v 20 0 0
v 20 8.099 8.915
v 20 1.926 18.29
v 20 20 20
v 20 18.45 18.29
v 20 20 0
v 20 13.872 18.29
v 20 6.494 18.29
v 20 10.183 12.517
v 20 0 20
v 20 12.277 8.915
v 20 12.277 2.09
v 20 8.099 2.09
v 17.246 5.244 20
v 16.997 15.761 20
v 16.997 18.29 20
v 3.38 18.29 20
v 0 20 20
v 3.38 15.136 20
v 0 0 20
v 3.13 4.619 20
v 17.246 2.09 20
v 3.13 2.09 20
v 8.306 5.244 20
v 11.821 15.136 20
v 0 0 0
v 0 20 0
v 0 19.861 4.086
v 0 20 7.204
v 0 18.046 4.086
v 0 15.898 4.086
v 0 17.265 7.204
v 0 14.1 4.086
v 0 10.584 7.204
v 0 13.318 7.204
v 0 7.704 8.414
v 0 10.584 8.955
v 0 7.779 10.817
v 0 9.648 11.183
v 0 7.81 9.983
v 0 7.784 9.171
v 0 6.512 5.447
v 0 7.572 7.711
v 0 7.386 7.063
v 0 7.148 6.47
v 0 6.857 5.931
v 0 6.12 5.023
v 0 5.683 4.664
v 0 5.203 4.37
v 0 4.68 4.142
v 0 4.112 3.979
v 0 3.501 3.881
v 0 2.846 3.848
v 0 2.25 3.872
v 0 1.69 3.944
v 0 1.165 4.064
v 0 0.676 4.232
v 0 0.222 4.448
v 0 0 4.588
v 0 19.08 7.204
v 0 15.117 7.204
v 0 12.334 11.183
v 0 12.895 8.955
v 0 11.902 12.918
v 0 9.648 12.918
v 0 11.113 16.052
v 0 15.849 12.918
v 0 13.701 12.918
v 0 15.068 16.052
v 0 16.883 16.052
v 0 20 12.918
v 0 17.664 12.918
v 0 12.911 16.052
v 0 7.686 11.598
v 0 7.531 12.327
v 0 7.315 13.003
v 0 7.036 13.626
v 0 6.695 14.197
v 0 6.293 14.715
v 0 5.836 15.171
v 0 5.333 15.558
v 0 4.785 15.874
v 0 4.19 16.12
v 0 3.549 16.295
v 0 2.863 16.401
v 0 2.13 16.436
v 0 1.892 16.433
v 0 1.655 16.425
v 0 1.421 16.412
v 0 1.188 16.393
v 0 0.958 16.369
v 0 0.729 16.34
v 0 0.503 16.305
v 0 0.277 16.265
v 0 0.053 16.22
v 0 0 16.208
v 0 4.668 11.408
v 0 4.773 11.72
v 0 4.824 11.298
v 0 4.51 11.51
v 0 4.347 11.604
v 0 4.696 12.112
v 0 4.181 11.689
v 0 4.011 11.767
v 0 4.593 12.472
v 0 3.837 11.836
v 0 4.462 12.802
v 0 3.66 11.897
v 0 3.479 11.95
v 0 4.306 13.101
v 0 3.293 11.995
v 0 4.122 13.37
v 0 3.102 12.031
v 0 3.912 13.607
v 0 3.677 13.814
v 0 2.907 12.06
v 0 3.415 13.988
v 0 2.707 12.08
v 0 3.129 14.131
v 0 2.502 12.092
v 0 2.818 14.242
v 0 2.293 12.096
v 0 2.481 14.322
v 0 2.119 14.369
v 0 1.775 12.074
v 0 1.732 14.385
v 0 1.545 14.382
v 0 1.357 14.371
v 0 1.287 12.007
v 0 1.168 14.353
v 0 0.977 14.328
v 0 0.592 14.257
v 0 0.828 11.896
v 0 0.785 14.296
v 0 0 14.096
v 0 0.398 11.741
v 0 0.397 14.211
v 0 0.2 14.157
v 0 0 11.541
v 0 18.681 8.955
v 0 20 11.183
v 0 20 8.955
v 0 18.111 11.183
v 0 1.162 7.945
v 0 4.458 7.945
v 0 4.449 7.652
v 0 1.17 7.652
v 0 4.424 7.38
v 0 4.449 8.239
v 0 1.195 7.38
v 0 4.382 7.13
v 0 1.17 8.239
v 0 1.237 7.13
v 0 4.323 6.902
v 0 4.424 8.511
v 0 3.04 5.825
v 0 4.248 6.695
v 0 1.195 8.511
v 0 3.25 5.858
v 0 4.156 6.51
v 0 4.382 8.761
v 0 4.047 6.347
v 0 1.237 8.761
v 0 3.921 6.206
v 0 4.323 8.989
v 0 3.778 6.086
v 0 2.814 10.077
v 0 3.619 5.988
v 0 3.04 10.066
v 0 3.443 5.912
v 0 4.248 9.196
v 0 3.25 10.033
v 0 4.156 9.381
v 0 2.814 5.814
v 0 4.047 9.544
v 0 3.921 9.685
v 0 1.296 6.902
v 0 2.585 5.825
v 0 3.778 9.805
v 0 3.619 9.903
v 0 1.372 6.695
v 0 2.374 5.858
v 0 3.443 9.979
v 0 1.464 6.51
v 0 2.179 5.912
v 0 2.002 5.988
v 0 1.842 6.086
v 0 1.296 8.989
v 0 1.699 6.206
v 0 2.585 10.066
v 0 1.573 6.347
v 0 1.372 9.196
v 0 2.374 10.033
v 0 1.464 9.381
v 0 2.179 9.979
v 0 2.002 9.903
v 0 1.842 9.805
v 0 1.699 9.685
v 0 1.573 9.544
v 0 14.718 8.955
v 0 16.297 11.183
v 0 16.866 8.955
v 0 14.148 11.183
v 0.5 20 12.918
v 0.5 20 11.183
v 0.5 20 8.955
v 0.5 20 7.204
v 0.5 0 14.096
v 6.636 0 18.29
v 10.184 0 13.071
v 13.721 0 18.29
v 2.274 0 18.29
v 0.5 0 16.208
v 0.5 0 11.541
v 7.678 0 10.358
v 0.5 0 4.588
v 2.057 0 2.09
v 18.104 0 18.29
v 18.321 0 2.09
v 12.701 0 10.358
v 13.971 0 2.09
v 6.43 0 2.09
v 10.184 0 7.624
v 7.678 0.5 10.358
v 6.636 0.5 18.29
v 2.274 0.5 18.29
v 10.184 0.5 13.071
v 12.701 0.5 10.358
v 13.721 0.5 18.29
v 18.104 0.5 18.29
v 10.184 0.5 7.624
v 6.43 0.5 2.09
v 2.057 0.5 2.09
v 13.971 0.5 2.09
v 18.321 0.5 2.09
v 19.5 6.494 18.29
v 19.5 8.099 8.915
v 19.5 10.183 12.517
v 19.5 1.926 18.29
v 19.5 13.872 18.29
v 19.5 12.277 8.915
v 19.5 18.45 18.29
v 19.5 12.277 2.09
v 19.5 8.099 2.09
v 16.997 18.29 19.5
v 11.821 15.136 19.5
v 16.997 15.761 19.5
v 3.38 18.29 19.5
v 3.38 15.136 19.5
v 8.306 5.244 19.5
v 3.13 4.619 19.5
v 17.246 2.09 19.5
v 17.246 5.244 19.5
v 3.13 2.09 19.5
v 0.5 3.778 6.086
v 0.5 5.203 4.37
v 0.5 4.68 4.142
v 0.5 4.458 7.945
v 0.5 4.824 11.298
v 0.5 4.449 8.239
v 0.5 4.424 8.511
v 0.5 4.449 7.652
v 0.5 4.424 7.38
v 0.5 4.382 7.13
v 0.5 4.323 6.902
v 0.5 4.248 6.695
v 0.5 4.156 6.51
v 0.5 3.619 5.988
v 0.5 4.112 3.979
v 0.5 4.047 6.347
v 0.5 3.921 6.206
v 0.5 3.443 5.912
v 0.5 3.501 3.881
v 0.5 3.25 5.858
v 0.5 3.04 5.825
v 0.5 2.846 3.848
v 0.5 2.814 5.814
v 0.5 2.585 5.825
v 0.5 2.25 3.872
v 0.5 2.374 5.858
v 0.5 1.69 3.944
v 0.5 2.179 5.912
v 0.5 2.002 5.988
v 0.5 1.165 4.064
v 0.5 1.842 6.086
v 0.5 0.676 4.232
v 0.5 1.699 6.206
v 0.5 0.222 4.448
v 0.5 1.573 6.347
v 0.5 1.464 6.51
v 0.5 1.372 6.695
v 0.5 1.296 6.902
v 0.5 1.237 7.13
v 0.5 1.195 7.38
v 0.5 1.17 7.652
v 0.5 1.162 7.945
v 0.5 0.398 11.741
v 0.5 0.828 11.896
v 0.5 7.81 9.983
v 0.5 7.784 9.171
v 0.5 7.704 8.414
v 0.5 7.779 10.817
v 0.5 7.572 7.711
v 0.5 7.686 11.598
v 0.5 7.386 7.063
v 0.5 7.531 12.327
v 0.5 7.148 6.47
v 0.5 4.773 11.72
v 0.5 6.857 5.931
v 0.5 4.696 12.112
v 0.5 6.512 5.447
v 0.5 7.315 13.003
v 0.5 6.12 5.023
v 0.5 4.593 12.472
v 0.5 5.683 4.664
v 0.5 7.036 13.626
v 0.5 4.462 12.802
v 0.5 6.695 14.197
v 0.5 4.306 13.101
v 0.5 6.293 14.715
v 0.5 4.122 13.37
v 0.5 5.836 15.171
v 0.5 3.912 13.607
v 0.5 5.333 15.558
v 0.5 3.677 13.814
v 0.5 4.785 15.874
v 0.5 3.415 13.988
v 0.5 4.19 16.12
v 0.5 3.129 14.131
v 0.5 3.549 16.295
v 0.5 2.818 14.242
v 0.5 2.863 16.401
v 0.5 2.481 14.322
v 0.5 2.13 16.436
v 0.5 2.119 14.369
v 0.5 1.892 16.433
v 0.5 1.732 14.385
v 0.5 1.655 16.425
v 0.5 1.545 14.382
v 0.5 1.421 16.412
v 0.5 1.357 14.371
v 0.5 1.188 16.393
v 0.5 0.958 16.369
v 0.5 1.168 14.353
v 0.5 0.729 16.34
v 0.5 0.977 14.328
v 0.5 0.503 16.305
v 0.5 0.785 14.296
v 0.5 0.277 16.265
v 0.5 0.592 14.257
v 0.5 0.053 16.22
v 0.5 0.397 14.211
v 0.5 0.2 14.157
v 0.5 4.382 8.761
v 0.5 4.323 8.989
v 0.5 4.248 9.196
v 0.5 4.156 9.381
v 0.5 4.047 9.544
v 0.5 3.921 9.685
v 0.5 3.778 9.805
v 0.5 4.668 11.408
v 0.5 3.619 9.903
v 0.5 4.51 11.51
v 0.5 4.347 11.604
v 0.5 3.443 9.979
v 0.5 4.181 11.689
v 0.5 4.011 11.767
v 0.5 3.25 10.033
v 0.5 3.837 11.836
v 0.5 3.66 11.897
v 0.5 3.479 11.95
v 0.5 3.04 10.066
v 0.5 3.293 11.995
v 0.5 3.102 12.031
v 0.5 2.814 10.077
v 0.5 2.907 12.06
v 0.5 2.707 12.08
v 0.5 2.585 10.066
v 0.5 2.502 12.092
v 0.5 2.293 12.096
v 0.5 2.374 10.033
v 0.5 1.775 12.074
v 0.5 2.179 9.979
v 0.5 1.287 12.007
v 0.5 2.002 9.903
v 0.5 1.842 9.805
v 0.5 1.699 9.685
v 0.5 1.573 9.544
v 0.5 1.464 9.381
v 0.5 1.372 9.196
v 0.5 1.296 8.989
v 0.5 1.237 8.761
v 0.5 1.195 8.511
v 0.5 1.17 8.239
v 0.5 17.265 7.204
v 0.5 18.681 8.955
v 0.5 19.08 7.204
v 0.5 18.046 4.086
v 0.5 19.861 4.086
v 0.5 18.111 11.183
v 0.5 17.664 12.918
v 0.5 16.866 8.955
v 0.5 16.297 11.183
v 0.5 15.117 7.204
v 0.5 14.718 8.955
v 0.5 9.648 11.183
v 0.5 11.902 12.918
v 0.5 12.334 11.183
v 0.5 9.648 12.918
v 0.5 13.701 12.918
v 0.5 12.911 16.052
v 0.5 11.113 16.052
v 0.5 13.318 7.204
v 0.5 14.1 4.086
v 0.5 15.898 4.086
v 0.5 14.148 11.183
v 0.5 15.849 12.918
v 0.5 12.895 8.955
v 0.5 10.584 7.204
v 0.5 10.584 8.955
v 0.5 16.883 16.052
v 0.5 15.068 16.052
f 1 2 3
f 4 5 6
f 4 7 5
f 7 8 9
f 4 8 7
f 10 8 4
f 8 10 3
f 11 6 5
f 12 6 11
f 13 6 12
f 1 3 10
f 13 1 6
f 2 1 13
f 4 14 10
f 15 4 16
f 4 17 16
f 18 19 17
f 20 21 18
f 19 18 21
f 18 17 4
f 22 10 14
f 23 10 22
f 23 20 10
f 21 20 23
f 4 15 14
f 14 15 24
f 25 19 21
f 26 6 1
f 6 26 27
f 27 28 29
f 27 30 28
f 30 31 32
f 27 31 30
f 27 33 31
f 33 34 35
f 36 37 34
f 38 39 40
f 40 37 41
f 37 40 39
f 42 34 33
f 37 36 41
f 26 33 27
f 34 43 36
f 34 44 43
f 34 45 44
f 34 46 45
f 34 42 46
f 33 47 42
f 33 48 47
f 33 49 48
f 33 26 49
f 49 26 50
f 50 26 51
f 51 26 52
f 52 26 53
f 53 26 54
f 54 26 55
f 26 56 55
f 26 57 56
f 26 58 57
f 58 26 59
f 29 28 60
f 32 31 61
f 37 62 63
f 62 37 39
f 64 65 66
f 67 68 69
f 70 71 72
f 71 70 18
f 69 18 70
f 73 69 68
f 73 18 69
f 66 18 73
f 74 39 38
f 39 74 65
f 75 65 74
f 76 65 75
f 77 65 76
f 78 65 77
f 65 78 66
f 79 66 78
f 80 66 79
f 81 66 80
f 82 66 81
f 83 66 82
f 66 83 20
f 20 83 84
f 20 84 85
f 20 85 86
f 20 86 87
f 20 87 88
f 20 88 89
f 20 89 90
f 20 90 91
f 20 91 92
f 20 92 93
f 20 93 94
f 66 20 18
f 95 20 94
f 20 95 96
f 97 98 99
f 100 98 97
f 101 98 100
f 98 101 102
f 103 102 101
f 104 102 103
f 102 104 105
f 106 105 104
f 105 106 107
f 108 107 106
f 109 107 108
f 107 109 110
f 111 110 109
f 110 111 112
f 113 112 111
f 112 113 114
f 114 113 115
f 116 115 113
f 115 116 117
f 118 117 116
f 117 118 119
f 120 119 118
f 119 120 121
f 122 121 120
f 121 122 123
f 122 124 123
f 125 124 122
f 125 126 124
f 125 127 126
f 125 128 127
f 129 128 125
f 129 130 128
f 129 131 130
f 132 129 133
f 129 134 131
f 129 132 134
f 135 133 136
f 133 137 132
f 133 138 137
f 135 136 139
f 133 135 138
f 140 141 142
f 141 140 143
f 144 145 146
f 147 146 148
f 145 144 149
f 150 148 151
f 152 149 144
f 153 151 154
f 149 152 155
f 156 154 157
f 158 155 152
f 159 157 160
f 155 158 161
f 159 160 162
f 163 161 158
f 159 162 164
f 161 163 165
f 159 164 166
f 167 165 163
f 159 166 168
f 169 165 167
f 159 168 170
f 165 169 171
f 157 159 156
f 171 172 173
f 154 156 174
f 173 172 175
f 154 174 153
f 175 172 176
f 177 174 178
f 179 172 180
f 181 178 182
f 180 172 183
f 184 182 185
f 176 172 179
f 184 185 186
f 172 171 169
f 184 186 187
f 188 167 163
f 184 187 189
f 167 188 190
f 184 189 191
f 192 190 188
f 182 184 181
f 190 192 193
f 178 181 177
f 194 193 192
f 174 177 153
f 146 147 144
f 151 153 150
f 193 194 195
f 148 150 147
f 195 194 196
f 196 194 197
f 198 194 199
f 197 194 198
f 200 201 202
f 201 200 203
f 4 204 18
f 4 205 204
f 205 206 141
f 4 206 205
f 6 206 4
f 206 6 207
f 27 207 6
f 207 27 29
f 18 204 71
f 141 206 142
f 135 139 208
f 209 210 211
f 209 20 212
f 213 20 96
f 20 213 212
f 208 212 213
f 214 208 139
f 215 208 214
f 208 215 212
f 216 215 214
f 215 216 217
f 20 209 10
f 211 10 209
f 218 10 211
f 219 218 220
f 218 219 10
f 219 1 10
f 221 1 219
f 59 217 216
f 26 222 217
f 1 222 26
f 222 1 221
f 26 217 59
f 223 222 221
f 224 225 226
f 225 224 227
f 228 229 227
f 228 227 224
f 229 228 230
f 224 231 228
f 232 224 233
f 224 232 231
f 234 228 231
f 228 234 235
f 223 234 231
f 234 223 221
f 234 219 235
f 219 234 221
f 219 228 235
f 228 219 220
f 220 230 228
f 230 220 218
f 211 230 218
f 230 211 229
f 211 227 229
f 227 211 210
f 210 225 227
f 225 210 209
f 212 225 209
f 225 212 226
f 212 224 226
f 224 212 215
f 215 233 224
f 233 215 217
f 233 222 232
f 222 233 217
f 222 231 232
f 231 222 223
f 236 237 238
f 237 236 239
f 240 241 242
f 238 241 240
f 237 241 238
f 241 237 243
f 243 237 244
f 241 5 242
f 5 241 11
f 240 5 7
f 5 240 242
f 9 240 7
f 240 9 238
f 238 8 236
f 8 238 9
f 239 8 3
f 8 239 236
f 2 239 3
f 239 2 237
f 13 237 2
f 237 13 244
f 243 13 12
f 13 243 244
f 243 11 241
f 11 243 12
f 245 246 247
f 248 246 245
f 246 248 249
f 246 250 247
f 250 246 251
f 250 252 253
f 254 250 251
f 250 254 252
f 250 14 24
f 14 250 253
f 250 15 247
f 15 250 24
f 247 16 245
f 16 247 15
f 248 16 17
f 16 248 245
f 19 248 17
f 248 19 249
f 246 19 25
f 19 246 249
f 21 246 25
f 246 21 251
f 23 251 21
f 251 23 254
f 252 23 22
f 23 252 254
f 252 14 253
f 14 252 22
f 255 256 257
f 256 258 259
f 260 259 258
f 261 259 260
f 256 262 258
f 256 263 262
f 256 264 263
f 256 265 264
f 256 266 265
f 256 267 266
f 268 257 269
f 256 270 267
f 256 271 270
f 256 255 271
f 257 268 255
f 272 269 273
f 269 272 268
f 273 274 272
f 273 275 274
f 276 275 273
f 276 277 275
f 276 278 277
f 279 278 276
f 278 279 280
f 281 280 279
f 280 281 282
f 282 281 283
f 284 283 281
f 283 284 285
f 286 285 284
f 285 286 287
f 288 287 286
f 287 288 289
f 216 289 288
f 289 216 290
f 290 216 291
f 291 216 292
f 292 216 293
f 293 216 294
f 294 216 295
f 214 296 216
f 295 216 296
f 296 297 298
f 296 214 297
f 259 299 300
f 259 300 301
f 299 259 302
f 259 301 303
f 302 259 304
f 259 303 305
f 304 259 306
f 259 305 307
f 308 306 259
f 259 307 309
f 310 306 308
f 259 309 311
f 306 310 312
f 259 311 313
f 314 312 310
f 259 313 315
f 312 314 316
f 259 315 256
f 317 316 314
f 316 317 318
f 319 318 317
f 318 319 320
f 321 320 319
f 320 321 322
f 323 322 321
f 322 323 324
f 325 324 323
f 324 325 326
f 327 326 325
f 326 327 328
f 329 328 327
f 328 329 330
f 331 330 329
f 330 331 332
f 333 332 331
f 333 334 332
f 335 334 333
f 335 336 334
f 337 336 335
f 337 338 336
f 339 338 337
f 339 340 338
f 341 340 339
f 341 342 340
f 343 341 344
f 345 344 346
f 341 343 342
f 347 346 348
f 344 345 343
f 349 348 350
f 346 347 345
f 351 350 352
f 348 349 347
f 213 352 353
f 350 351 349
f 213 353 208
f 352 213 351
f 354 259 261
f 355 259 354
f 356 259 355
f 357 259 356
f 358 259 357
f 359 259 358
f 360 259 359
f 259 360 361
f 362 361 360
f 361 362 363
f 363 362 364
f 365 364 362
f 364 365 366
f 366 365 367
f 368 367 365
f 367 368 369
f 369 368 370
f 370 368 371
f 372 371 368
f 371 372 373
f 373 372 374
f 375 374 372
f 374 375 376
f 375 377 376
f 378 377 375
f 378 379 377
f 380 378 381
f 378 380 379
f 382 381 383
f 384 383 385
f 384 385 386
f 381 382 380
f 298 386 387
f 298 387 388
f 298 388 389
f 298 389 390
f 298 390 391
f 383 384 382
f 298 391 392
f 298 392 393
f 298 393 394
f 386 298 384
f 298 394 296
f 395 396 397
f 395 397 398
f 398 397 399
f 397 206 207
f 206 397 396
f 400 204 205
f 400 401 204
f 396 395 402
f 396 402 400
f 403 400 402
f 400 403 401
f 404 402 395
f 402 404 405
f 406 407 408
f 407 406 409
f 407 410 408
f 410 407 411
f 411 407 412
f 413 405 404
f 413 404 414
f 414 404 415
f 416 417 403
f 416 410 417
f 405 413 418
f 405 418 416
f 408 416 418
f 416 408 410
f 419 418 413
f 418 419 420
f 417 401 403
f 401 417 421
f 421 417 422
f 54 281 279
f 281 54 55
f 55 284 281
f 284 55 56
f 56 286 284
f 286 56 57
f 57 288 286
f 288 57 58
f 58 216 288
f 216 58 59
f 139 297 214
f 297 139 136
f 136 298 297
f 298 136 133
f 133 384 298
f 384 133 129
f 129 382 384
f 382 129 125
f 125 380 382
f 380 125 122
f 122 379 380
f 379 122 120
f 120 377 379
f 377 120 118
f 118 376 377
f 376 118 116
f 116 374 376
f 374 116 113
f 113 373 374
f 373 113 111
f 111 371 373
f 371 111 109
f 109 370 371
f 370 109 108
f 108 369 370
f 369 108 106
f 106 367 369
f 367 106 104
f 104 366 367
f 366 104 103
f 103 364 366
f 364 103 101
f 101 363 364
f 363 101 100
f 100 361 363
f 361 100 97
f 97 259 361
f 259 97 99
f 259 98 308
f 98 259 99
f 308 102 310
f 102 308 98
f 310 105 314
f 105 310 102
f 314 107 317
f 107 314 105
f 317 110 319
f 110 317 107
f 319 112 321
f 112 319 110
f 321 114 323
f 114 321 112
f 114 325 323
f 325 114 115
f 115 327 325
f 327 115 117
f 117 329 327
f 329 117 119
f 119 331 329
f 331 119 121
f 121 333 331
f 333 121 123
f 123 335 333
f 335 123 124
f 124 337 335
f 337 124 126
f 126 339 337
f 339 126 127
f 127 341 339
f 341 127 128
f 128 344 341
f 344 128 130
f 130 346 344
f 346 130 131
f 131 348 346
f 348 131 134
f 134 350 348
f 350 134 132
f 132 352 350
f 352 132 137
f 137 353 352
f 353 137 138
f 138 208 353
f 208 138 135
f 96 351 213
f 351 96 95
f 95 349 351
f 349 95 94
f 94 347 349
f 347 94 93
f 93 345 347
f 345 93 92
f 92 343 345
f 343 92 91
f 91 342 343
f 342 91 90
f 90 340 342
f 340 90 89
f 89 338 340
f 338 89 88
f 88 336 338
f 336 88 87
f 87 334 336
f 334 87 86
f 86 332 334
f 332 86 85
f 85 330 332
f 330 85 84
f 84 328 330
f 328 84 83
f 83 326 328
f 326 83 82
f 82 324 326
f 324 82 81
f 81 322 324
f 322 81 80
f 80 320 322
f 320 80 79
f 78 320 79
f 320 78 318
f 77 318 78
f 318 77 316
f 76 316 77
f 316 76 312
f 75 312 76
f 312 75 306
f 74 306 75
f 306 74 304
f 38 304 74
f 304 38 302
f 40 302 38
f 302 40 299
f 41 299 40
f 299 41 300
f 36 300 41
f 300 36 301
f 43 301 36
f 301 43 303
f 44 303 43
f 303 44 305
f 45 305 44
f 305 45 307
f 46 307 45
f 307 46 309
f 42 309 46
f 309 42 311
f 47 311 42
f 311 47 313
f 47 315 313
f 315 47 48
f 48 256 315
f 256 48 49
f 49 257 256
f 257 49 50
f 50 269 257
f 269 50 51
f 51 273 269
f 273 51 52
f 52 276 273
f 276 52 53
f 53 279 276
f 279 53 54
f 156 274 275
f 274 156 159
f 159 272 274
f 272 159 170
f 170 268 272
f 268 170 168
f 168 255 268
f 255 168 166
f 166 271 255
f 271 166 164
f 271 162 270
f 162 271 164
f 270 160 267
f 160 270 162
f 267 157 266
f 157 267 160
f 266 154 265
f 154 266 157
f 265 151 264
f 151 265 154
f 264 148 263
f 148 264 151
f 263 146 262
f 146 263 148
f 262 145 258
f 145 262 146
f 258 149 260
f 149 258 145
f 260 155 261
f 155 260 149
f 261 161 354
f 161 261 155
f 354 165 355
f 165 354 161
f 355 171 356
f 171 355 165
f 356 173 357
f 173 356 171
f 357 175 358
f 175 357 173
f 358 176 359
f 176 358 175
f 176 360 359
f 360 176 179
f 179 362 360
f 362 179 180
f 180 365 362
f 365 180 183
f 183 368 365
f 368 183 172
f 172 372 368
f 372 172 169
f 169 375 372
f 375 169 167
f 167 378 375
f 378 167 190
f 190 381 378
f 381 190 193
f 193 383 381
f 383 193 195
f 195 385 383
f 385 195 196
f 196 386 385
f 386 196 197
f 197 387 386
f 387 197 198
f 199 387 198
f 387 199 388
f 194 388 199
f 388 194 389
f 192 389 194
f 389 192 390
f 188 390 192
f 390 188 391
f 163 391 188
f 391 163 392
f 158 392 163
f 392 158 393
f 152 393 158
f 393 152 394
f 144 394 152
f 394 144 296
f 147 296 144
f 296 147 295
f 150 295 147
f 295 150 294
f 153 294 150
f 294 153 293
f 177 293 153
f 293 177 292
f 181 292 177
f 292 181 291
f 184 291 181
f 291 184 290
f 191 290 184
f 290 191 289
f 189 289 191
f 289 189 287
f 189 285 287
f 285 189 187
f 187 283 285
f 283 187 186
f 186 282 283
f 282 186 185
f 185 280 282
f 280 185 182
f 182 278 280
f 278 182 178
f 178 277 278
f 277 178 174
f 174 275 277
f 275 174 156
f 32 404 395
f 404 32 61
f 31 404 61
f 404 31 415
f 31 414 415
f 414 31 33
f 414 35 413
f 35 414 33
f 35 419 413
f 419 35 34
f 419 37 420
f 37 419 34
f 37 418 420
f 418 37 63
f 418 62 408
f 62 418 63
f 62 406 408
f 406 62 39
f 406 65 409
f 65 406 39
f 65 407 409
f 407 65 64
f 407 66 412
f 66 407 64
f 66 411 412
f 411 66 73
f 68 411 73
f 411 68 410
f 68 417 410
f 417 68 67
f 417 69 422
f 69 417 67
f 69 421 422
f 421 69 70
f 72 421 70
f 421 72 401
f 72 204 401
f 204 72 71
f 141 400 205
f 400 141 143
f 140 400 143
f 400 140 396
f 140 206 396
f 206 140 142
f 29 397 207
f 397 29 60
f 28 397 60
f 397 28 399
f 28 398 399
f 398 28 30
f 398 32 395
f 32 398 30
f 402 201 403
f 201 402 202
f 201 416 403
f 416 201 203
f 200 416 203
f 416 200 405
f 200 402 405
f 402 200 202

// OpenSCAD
$fn = 50;
size = 20;

difference(size) {
  cube(size);

  translate([size/2, 0.5, size/2])
    rotate([90, 0, 0])
    linear_extrude(3)
    text("X", font="Roboto Condense:style=Bold", halign = "center",
	 valign = "center", size = size*0.8);

  translate([size - 0.5, size/2, size/2])
    rotate([90, 0, 90])
    linear_extrude(3)
    text("Y", font="Roboto Condense:style=Bold", halign = "center",
	 valign = "center", size = size*0.8);

  translate([size/2, size/2, size - 0.5])
    linear_extrude(3)
    text("Z", font="Roboto Condense:style=Bold", halign = "center",
	 valign = "center", size = size*0.8);

  translate([0.5, size/2, size/2])
    rotate([90, 0, -90])
    linear_extrude(3)
    text("#6", font="Roboto Condense:style=Bold", halign = "center",
	 valign = "center", size = size*0.6);
}
